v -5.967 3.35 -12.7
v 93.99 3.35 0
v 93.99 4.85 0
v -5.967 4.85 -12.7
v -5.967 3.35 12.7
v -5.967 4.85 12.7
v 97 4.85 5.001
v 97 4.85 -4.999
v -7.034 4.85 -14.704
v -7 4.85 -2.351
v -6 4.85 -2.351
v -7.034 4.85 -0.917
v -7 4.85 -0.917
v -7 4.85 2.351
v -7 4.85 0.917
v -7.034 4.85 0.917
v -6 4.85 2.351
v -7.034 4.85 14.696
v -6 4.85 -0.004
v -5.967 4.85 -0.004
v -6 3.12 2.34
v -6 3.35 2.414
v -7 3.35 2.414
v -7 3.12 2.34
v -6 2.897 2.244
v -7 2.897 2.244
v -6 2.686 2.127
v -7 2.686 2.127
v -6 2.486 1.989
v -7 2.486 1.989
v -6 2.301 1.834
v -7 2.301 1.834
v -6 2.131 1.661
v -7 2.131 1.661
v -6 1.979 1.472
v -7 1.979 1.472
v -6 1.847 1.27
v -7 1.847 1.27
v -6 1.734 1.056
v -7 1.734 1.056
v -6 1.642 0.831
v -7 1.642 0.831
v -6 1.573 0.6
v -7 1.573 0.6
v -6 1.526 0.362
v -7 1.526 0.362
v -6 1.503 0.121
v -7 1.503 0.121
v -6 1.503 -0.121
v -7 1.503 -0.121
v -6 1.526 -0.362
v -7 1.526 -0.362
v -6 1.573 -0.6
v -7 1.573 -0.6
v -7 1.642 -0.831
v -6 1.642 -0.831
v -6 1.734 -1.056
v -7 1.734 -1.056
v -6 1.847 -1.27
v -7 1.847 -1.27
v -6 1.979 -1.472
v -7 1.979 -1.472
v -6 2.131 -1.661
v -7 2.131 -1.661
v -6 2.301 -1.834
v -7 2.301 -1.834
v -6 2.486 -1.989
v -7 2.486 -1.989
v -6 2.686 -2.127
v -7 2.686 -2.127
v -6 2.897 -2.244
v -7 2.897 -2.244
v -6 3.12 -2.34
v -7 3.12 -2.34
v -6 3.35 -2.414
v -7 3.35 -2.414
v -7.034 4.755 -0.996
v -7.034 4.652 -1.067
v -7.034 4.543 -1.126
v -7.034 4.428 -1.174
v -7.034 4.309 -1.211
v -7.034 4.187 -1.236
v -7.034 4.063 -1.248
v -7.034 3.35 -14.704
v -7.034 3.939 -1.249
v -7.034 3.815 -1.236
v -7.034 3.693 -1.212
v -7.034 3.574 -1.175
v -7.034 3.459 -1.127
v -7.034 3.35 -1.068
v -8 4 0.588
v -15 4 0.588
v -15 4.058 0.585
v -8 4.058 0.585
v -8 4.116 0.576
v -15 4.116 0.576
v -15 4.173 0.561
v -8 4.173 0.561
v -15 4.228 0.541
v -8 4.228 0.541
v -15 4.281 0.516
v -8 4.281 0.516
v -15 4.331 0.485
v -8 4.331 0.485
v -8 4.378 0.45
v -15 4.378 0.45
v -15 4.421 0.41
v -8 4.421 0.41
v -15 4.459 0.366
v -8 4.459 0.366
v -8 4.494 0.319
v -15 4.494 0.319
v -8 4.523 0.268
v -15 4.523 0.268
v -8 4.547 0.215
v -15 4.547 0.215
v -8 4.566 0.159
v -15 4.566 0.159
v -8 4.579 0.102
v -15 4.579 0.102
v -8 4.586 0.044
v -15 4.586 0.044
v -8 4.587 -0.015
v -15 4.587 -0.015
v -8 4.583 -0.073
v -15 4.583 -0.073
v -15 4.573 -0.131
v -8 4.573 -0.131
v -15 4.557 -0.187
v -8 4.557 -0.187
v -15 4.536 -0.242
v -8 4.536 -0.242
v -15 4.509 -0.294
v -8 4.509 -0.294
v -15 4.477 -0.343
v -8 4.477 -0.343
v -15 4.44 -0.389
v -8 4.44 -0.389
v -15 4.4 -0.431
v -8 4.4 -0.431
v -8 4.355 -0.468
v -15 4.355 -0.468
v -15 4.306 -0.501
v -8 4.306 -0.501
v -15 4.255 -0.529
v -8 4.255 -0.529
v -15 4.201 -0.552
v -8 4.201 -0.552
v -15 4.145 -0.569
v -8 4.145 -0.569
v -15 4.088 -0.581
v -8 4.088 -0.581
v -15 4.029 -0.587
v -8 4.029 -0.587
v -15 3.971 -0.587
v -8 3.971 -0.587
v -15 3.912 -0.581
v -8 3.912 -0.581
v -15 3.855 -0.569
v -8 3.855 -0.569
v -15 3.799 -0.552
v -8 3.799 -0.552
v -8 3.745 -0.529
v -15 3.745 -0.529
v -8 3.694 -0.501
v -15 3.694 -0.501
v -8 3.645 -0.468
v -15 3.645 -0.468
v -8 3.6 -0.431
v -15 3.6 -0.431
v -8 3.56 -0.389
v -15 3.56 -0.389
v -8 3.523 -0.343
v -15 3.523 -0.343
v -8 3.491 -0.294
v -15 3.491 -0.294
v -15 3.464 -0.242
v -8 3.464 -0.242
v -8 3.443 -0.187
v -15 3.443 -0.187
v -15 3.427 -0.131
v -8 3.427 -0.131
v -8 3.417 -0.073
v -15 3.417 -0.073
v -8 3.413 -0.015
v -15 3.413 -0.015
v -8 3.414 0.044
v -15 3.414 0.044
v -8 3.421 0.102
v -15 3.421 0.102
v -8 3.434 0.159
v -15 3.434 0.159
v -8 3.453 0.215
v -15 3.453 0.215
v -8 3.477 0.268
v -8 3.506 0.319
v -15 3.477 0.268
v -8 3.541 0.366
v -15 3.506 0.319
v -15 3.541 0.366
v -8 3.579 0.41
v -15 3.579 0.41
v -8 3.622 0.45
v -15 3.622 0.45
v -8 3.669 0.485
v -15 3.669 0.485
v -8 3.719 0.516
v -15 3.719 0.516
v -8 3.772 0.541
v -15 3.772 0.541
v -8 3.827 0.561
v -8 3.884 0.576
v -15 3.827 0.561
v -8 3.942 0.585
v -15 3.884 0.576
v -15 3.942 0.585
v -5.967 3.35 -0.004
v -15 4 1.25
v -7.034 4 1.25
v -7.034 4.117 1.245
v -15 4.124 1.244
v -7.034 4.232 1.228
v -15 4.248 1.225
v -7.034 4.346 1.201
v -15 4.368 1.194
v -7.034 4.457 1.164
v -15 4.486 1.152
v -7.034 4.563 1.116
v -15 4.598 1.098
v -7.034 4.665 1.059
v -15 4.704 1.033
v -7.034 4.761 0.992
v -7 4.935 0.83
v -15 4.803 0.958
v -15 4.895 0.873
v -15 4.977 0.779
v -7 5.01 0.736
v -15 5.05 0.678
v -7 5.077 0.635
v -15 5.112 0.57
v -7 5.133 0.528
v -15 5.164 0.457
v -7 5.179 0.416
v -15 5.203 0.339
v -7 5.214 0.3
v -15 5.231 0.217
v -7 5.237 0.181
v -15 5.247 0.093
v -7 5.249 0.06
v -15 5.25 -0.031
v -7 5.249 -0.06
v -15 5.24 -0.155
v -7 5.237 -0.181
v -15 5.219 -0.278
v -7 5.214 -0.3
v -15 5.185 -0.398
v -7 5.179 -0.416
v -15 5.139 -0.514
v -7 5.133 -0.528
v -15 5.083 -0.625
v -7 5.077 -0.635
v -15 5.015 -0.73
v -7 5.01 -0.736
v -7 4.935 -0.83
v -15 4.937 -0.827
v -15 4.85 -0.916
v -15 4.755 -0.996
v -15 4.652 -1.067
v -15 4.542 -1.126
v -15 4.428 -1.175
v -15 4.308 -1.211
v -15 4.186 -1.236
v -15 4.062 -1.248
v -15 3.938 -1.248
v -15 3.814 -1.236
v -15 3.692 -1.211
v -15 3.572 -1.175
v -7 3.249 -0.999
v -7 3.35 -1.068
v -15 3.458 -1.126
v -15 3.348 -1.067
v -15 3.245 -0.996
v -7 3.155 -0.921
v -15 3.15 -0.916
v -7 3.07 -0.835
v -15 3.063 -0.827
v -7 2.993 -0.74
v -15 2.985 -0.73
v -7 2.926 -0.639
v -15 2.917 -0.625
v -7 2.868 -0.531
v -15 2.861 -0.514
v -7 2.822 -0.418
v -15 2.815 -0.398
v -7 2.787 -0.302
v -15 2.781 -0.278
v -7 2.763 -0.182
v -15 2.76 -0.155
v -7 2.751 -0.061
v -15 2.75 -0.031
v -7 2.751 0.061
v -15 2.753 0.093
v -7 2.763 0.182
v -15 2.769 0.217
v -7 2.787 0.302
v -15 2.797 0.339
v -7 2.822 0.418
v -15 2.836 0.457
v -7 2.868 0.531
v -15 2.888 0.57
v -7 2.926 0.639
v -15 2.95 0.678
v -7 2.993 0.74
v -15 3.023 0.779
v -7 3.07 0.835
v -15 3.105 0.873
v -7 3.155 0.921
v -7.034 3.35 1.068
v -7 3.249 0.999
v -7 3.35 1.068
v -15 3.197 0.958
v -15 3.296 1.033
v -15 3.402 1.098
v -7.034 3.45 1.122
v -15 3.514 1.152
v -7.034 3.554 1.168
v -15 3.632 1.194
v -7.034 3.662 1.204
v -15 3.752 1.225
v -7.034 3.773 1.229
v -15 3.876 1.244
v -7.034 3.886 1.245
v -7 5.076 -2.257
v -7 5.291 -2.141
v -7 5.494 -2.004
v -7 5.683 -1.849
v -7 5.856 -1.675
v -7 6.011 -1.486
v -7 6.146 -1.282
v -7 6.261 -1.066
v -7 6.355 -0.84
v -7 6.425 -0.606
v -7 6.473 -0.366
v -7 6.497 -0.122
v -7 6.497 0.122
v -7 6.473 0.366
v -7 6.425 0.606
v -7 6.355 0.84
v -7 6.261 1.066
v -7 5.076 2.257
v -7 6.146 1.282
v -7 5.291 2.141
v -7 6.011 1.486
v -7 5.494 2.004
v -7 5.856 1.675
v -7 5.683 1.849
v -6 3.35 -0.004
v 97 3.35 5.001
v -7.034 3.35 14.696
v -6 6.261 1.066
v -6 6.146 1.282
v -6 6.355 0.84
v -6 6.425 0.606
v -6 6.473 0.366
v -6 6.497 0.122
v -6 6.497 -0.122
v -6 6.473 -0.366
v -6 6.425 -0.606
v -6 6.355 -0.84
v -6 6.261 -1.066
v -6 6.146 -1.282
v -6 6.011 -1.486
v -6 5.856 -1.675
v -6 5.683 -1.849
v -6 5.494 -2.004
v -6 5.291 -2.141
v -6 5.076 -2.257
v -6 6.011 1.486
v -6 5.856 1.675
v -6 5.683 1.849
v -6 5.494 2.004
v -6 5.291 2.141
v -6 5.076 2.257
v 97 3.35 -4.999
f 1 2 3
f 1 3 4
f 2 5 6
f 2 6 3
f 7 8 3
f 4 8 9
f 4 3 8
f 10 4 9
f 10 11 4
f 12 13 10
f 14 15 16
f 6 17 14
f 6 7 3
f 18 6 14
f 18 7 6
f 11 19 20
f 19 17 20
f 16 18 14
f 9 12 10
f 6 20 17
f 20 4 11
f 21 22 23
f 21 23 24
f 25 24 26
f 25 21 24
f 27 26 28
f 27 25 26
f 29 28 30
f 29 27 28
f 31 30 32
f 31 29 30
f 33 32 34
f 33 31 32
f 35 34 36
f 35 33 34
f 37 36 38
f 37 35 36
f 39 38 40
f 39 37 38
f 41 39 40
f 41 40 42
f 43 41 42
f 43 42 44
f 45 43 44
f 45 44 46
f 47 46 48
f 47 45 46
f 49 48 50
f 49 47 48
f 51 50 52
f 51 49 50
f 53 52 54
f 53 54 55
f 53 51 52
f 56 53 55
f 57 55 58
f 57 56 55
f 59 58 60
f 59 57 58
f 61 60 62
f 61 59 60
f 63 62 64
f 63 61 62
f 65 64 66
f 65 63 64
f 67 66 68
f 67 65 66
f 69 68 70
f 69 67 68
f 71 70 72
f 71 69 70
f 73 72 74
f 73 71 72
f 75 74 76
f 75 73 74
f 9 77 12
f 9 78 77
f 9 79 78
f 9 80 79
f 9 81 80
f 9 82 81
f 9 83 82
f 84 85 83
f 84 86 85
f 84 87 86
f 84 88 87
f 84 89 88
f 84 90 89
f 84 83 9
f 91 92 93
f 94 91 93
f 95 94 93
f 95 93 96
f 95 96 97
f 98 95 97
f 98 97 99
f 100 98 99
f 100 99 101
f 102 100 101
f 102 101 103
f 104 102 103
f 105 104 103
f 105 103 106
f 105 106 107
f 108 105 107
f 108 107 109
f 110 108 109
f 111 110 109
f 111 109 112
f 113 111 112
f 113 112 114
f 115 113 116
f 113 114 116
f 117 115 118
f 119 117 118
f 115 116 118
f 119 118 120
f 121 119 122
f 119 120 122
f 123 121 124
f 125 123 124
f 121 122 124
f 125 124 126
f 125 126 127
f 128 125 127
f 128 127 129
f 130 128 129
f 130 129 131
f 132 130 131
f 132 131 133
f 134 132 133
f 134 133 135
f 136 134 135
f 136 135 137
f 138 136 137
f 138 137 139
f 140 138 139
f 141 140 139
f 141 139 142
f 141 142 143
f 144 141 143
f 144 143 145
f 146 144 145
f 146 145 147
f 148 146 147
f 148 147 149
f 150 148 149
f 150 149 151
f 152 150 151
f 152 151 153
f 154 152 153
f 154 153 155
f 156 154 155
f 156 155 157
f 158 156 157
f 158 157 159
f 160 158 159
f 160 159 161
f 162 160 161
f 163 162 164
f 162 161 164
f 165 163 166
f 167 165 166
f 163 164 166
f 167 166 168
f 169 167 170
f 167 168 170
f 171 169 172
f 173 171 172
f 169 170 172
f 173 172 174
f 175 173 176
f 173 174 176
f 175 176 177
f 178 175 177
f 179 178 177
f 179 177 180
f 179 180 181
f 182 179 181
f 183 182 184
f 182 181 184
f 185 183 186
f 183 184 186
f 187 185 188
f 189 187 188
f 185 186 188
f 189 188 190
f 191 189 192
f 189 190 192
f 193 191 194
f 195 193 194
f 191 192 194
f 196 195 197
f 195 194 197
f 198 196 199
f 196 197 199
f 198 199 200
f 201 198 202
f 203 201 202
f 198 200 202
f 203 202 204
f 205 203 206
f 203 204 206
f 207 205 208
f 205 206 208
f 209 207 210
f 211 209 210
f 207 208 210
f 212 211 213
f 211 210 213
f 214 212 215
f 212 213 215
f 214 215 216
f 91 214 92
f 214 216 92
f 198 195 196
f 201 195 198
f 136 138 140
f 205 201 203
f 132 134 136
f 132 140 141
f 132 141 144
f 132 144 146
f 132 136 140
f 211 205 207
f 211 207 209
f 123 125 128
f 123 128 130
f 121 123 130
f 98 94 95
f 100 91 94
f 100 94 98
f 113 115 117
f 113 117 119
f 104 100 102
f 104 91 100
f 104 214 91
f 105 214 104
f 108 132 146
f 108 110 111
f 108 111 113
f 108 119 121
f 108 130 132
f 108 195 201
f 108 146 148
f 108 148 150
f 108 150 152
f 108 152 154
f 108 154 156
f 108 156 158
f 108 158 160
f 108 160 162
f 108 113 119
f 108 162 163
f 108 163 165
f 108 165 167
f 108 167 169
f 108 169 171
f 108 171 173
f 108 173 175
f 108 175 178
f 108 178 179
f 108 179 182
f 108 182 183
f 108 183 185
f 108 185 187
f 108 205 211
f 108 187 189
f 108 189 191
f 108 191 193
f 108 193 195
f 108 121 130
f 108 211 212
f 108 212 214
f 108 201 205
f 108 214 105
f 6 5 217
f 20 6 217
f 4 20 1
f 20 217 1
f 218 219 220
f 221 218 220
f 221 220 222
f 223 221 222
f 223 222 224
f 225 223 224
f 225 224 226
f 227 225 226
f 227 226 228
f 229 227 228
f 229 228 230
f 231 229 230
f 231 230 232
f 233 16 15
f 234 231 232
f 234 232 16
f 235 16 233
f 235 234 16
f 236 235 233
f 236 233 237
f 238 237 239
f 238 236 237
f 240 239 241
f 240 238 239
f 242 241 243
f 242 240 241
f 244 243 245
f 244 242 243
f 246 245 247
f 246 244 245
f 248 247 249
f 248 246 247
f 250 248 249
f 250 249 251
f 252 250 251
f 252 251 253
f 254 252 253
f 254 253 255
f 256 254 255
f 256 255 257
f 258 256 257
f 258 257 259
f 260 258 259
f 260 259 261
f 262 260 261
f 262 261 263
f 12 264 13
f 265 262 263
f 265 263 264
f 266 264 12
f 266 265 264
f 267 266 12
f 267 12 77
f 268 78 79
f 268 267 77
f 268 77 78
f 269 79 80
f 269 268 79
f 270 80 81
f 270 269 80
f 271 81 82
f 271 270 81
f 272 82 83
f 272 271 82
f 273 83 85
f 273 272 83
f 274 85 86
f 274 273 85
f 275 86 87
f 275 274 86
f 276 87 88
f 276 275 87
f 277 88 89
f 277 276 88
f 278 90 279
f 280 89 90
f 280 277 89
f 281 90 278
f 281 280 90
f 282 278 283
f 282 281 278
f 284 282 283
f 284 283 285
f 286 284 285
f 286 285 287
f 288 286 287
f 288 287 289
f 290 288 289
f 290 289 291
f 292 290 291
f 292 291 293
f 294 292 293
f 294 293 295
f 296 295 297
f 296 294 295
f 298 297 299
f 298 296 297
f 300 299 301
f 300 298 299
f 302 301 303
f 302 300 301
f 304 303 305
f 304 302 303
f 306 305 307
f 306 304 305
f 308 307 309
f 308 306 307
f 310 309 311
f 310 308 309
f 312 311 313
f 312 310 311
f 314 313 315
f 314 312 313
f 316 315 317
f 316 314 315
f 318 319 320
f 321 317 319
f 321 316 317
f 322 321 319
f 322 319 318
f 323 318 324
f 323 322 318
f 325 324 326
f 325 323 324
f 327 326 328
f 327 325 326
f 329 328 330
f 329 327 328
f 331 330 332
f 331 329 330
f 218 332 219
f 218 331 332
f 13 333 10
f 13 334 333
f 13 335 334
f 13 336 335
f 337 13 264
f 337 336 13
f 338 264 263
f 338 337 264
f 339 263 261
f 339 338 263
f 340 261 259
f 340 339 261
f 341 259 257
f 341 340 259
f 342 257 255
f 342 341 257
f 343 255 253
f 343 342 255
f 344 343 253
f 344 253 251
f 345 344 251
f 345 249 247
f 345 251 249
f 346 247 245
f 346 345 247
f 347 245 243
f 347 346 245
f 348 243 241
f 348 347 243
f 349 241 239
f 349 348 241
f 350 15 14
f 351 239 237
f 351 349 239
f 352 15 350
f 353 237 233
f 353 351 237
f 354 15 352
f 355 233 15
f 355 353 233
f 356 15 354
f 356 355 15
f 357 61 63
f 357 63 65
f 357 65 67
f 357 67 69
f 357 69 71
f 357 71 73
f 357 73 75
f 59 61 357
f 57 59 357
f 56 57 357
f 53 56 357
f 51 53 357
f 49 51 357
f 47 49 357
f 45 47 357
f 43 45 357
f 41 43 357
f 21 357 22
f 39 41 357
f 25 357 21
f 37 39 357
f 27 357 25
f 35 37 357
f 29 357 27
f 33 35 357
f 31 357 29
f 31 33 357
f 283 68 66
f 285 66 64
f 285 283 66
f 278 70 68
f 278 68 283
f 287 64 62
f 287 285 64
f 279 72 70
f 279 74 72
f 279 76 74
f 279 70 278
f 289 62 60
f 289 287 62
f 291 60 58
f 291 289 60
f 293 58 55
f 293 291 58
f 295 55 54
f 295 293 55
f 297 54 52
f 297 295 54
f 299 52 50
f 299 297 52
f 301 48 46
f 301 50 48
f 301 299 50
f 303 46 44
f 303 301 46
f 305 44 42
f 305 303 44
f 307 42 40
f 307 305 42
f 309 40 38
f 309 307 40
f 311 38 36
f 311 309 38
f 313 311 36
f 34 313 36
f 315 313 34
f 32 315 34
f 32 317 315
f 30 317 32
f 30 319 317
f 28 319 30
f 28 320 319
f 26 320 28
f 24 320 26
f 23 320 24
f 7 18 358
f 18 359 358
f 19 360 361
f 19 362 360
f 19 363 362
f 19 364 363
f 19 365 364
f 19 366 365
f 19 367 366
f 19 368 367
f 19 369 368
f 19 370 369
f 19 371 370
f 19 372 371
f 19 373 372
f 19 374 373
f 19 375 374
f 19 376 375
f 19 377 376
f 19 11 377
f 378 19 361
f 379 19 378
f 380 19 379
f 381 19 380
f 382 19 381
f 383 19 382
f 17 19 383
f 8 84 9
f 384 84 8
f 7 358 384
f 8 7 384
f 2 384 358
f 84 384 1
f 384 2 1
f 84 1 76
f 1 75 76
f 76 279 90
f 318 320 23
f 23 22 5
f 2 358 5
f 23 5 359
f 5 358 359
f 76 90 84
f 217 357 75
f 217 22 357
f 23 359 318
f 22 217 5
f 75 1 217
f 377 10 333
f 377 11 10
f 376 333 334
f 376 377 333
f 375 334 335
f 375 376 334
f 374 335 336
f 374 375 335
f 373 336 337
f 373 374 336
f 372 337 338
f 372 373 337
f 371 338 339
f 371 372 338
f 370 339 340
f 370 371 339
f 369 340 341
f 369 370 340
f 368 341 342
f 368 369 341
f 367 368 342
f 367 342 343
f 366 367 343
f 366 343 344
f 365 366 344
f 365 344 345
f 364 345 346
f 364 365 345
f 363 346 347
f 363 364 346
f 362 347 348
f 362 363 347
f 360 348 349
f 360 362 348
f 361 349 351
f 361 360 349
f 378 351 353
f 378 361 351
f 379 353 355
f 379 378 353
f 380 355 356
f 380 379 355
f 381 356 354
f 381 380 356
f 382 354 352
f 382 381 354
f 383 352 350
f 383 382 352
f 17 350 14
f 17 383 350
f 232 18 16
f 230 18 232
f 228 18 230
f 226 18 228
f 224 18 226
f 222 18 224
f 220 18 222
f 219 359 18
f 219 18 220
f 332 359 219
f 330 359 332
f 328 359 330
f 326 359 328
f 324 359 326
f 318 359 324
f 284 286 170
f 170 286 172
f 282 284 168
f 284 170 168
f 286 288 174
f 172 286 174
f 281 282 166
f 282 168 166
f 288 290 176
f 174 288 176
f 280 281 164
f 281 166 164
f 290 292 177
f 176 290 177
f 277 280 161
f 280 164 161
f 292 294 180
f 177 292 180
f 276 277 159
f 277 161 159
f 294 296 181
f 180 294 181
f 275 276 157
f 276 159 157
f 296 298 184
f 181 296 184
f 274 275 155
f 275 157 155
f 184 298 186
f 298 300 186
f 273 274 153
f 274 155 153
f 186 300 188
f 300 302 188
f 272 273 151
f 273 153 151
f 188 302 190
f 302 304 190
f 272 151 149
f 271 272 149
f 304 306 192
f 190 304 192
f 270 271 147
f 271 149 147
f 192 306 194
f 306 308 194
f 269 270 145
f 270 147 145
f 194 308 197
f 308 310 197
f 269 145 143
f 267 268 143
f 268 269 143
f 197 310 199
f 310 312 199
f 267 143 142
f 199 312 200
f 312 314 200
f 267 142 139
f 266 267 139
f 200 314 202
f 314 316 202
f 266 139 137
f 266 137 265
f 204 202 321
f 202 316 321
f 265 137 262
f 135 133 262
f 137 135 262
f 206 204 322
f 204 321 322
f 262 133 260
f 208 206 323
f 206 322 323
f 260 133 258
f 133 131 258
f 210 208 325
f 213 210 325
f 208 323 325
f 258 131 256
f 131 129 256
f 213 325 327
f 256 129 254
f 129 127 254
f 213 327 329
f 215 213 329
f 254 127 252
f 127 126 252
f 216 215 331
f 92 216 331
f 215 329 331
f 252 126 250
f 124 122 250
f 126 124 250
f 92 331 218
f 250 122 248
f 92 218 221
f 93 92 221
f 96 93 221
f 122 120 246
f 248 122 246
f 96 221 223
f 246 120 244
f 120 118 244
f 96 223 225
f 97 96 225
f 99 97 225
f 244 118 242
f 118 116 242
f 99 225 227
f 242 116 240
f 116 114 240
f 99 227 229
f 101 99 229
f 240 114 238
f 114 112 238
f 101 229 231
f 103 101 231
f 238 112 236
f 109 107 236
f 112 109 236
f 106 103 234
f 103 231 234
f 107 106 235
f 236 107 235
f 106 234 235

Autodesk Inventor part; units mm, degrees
ref_plane "YZ Plane" through (0, 0, 0) normal (1, 0, 0) x (0, 1, 0)
ref_plane "XY Plane" through (0, 0, 0) normal (0, 0, 1) x (1, 0, 0)
sketch "Sketch1" plane through (0, 0, 0) normal (0, 1, 0) x (-1, 0, 0)
  arc A0 (0, -5) -> (0, 5) centre (0, 0) ccw
  line L0 (0, 5) -> (0, -5)
  dimension "d0" = 10
extrude "Extrusion1" add sketch "Sketch1" along normal blind 10
sketch "Sketch2" plane through (0, 0, 0) normal (1, 0, 0) x (0, 1, 0)
  line L0 (8.0172, -4.5) -> (8.0172, 4.5)
  line L1 (8.0172, 4.5) -> (2.5172, 4.5)
  line L2 (2.5172, -4.5) -> (0.0172, -2)
  line L3 (2.5172, 4.5) -> (0.0172, 2)
  line L4 (0.0172, -2) -> (0.0172, 2)
  line L5 (8.0172, -4.5) -> (2.5172, -4.5)
  point P0 (0, 0)
  dimension "d3" = 9
  dimension "d4" = 8
sketch "Sketch3" plane through (0, 0, 0) normal (1, 0, 0) x (0, 1, 0)
  line L0 (0, 2) -> (3, 5)
  arc A0 (3, 5) -> (0, 2) centre (1, 4) ccw
  line L1 (0, -2) -> (4, -6)
  arc A1 (0, -2) -> (4, -6) centre (1.75, -4.25) ccw
  line L2 (8.0325, 5) -> (11, 5)
  line L3 (11, 5) -> (11, -6)
  line L4 (11, -6) -> (8.0325, -6)
  line L5 (8.0325, -6) -> (8.0325, 5)
  line L6 (2.4911, 4.4911) -> (5, 7)
  line L7 (2.4911, 4.4911) -> (8.0325, 4.4911)
  arc A2 (8.0325, 4.4911) -> (5, 7) centre (7, 6.3303) ccw
  line L8 (2.4911, -4.4911) -> (8.5706, -4.4911)
  arc A3 (2.4911, -4.4911) -> (8.5706, -4.4911) centre (5.5309, -7.5041) ccw
  point P0 (0, 0)
extrude "Extrusion2" cut sketch "Sketch3" against normal through all
sketch "Sketch4" plane through (0, 0, 0) normal (0, 1, 0) x (-1, 0, 0)
  arc A0 (1.0726, -4.4911) -> (1.0726, 4.4911) centre (-1.125, 0) ccw
  arc A1 (1.0726, 4.4911) -> (1.0726, -4.4911) centre (-0.4517, 0) ccw
  point P0 (0, 0)
  point P1 (2.1976, -4.4911)
  point P2 (2.1976, 4.4911)
  dimension "d9" = 1.125
  dimension "d10" = 1.125
extrude "Extrusion3" cut sketch "Sketch4" along normal through all both and the other way through all
sketch "Sketch5" plane through (0, 0, 0) normal (1, 0, 0) x (0, 1, 0)
  line L0 (1.6, -1.2445) -> (1.6, 1.1555)
  line L1 (6.4325, 2.6911) -> (3.1125, 2.6911)
  line L2 (6.4325, -2.6911) -> (6.4325, 2.6911)
  line L3 (6.4325, -2.6911) -> (3.1125, -2.6911)
  line L4 (0, 2) -> (0, -2) projected
  line L5 (8.0325, 4.4911) -> (8.0325, -4.4911) projected
  line L6 (0, 2) -> (2.4911, 4.4911) projected
  line L7 (2.4911, 4.4911) -> (8.0325, 4.4911) projected
  line L8 (8.0325, 4.4911) -> (8.0325, -4.4911) projected
  line L9 (8.0325, -4.4911) -> (2.4911, -4.4911) projected
  line L10 (2.4911, -4.4911) -> (0, -2) projected
  line L11 (0, 2) -> (0, -2) projected
  line L12 (1.6, 1.1555) -> (3.1125, 2.6911)
  line L13 (1.6, -1.2445) -> (3.1125, -2.6911)
  line L14 (1.6, 4.6579) -> (1.6, -5.3823)
  arc A0 (1.6, 4.6579) -> (1.6, -5.3823) centre (3.2437, -0.3622) ccw
  line L15 (1.6, 1.1555) -> (5.4757, 5.0906)
  line L16 (1.6, 1.1555) -> (1.6, 7.5999)
  arc A1 (5.4757, 5.0906) -> (1.6, 7.5999) centre (3.8837, 6.8794) ccw
  line L17 (3.1125, 2.6911) -> (12.4034, 2.6911)
  line L18 (3.1125, 2.6911) -> (8.5318, 8.1936)
  arc A2 (12.4034, 2.6911) -> (8.5318, 8.1936) centre (8.3272, 3.9364) ccw
  line L19 (6.4325, 2.6911) -> (13.6333, 2.6911)
  line L20 (6.4325, 2.6911) -> (6.4325, -9.3636)
  arc A3 (6.4325, -9.3636) -> (13.6333, 2.6911) centre (6.37, -1.1482) ccw
  line L21 (6.4325, -2.6911) -> (6.4325, -11.5775)
  line L22 (6.4325, -2.6911) -> (3.1125, -2.6911)
  line L23 (3.1125, -2.6911) -> (3.2437, -12.8567)
  arc A4 (3.2437, -12.8567) -> (6.4325, -9.3636) centre (5.6123, -11.8169) ccw
  line L24 (1.6, -1.2445) -> (1.6, -8.2222)
  line L25 (1.6, -1.2445) -> (3.1125, -2.6911)
  line L26 (3.1125, -2.6911) -> (3.1946, -9.0574)
  arc A5 (1.6, -8.2222) -> (3.1946, -9.0574) centre (2.6381, -8.1801) ccw
  point P0 (0, 0)
  dimension "d16" = 1.6
  dimension "d18" = 1.6
  dimension "d21" = 1.8
  dimension "d23" = 1.8
  dimension "d24" = 2.4
  dimension "d26" = 3.32
  dimension "d27" = 3.32
extrude "Extrusion4" cut sketch "Sketch5" against normal through all contours L14 L10 L4 L6 L0 | L13 L23 L9 L10 L14 | L14 L6 L7 L15 L12 | L3 L20 L9 L23 | L14 A0 L6 L4 L10 | L10 L9 L23 A5 L24 L14 | L15 L7 L5 L17 L1 | L14 L16 A1 L15 L7 L6 | L2 L17 L5 L9 L20 | L9 L20 A4 L23 | L15 L18 A2 L17 L5 L7 | L9 L5 L17 L19 A3 L20
sketch "Sketch6" plane through (0, 0, 0) normal (1, 0, 0) x (0, 1, 0)
  circle A0 centre (4, 0) radius 2.5
  line L0 (1.6, -1.2445) -> (1.6, 1.1555) projected
  point P0 (0, 0)
  dimension "d31" = 5
  dimension "d32" = 2.4
extrude "Extrusion5" add sketch "Sketch6" against normal blind 15
sketch "Sketch7" plane through (0, 0, 0) normal (0, 1, 0) x (-1, 0, 0)
  arc A0 (3.089, -2.6911) -> (3.7176, -1.2445) centre (-1.125, 0) ccw
  arc A1 (3.7397, 1.1555) -> (3.089, 2.6911) centre (-1.125, 0) ccw projected
  arc A2 (3.7176, -1.2445) -> (3.7397, 1.1555) centre (-1.125, 0) ccw
  arc A3 (3.089, 2.6911) -> (3.089, -2.6911) centre (1.3425, 0) ccw
  point P0 (0, 0)
extrude "Extrusion6" cut sketch "Sketch7" along normal through all
sketch "Sketch8" plane through (-15, 4, 0) normal (-1, 0, 0) x (0, 0, 1)
  circle A0 centre (0, 0) radius 0.5875
  point P0 (0, -4)
  dimension "d37" = 1.175
extrude "Extrusion7" cut sketch "Sketch8" against normal blind 7
sketch "Sketch9" plane through (0, 0, 0) normal (0, 1, 0) x (-1, 0, 0)
  line L0 (6, 3) -> (2, 3)
  line L1 (2, 3) -> (2, -3)
  line L2 (2, -3) -> (6, -3)
  line L3 (6, -3) -> (6, 3)
  point P0 (0, 0)
extrude "Extrusion8" cut sketch "Sketch9" along normal through all both and the other way through all
sketch "Sketch10" plane through (-15, 4, 0) normal (-1, 0, 0) x (0, 0, 1)
  circle A0 centre (0, 0) radius 1.25
  circle A1 centre (0, 0) radius 3.9528
  point P0 (0, -4)
  dimension "d67" = 2.5
extrude "Extrusion9" cut sketch "Sketch10" against normal blind 8
ref_plane "Work Plane1" through (0, 4.1, 0) normal (0, 1, 0) x (-1, 0, 0)
sketch "Sketch12" plane through (0, 4.1, 0) normal (0, 1, 0) x (-1, 0, 0)
  line L0 (15, -1) -> (15, 1)
  line L1 (5.9669, 12.7) -> (5.9669, -12.7)
  line L2 (5.9669, 12.7) -> (-93.99, 0)
  line L3 (-93.99, 0) -> (5.9669, -12.7)
  line L4 (7.0341, 14.6962) -> (7.0341, -14.7038)
  line L5 (2.03, -0.0038) -> (19.03, -0.0038)
  line L6 (-97, 5.0008) -> (-97, -4.9992)
  line L7 (7.0341, 14.6962) -> (-97, 5.0008)
  line L8 (7.0341, -14.7038) -> (-97, -4.9992)
  point P0 (0, 0)
  point P1 (0, 0)
  dimension "d61" = 25.4
  dimension "d62" = 29.4
  dimension "d63" = 14.7
  dimension "d64" = 10
extrude "Extrusion11" add sketch "Sketch12" along normal mid plane 1.5
properties part number "piezo_mounted_whisk_deflector_LONG"
